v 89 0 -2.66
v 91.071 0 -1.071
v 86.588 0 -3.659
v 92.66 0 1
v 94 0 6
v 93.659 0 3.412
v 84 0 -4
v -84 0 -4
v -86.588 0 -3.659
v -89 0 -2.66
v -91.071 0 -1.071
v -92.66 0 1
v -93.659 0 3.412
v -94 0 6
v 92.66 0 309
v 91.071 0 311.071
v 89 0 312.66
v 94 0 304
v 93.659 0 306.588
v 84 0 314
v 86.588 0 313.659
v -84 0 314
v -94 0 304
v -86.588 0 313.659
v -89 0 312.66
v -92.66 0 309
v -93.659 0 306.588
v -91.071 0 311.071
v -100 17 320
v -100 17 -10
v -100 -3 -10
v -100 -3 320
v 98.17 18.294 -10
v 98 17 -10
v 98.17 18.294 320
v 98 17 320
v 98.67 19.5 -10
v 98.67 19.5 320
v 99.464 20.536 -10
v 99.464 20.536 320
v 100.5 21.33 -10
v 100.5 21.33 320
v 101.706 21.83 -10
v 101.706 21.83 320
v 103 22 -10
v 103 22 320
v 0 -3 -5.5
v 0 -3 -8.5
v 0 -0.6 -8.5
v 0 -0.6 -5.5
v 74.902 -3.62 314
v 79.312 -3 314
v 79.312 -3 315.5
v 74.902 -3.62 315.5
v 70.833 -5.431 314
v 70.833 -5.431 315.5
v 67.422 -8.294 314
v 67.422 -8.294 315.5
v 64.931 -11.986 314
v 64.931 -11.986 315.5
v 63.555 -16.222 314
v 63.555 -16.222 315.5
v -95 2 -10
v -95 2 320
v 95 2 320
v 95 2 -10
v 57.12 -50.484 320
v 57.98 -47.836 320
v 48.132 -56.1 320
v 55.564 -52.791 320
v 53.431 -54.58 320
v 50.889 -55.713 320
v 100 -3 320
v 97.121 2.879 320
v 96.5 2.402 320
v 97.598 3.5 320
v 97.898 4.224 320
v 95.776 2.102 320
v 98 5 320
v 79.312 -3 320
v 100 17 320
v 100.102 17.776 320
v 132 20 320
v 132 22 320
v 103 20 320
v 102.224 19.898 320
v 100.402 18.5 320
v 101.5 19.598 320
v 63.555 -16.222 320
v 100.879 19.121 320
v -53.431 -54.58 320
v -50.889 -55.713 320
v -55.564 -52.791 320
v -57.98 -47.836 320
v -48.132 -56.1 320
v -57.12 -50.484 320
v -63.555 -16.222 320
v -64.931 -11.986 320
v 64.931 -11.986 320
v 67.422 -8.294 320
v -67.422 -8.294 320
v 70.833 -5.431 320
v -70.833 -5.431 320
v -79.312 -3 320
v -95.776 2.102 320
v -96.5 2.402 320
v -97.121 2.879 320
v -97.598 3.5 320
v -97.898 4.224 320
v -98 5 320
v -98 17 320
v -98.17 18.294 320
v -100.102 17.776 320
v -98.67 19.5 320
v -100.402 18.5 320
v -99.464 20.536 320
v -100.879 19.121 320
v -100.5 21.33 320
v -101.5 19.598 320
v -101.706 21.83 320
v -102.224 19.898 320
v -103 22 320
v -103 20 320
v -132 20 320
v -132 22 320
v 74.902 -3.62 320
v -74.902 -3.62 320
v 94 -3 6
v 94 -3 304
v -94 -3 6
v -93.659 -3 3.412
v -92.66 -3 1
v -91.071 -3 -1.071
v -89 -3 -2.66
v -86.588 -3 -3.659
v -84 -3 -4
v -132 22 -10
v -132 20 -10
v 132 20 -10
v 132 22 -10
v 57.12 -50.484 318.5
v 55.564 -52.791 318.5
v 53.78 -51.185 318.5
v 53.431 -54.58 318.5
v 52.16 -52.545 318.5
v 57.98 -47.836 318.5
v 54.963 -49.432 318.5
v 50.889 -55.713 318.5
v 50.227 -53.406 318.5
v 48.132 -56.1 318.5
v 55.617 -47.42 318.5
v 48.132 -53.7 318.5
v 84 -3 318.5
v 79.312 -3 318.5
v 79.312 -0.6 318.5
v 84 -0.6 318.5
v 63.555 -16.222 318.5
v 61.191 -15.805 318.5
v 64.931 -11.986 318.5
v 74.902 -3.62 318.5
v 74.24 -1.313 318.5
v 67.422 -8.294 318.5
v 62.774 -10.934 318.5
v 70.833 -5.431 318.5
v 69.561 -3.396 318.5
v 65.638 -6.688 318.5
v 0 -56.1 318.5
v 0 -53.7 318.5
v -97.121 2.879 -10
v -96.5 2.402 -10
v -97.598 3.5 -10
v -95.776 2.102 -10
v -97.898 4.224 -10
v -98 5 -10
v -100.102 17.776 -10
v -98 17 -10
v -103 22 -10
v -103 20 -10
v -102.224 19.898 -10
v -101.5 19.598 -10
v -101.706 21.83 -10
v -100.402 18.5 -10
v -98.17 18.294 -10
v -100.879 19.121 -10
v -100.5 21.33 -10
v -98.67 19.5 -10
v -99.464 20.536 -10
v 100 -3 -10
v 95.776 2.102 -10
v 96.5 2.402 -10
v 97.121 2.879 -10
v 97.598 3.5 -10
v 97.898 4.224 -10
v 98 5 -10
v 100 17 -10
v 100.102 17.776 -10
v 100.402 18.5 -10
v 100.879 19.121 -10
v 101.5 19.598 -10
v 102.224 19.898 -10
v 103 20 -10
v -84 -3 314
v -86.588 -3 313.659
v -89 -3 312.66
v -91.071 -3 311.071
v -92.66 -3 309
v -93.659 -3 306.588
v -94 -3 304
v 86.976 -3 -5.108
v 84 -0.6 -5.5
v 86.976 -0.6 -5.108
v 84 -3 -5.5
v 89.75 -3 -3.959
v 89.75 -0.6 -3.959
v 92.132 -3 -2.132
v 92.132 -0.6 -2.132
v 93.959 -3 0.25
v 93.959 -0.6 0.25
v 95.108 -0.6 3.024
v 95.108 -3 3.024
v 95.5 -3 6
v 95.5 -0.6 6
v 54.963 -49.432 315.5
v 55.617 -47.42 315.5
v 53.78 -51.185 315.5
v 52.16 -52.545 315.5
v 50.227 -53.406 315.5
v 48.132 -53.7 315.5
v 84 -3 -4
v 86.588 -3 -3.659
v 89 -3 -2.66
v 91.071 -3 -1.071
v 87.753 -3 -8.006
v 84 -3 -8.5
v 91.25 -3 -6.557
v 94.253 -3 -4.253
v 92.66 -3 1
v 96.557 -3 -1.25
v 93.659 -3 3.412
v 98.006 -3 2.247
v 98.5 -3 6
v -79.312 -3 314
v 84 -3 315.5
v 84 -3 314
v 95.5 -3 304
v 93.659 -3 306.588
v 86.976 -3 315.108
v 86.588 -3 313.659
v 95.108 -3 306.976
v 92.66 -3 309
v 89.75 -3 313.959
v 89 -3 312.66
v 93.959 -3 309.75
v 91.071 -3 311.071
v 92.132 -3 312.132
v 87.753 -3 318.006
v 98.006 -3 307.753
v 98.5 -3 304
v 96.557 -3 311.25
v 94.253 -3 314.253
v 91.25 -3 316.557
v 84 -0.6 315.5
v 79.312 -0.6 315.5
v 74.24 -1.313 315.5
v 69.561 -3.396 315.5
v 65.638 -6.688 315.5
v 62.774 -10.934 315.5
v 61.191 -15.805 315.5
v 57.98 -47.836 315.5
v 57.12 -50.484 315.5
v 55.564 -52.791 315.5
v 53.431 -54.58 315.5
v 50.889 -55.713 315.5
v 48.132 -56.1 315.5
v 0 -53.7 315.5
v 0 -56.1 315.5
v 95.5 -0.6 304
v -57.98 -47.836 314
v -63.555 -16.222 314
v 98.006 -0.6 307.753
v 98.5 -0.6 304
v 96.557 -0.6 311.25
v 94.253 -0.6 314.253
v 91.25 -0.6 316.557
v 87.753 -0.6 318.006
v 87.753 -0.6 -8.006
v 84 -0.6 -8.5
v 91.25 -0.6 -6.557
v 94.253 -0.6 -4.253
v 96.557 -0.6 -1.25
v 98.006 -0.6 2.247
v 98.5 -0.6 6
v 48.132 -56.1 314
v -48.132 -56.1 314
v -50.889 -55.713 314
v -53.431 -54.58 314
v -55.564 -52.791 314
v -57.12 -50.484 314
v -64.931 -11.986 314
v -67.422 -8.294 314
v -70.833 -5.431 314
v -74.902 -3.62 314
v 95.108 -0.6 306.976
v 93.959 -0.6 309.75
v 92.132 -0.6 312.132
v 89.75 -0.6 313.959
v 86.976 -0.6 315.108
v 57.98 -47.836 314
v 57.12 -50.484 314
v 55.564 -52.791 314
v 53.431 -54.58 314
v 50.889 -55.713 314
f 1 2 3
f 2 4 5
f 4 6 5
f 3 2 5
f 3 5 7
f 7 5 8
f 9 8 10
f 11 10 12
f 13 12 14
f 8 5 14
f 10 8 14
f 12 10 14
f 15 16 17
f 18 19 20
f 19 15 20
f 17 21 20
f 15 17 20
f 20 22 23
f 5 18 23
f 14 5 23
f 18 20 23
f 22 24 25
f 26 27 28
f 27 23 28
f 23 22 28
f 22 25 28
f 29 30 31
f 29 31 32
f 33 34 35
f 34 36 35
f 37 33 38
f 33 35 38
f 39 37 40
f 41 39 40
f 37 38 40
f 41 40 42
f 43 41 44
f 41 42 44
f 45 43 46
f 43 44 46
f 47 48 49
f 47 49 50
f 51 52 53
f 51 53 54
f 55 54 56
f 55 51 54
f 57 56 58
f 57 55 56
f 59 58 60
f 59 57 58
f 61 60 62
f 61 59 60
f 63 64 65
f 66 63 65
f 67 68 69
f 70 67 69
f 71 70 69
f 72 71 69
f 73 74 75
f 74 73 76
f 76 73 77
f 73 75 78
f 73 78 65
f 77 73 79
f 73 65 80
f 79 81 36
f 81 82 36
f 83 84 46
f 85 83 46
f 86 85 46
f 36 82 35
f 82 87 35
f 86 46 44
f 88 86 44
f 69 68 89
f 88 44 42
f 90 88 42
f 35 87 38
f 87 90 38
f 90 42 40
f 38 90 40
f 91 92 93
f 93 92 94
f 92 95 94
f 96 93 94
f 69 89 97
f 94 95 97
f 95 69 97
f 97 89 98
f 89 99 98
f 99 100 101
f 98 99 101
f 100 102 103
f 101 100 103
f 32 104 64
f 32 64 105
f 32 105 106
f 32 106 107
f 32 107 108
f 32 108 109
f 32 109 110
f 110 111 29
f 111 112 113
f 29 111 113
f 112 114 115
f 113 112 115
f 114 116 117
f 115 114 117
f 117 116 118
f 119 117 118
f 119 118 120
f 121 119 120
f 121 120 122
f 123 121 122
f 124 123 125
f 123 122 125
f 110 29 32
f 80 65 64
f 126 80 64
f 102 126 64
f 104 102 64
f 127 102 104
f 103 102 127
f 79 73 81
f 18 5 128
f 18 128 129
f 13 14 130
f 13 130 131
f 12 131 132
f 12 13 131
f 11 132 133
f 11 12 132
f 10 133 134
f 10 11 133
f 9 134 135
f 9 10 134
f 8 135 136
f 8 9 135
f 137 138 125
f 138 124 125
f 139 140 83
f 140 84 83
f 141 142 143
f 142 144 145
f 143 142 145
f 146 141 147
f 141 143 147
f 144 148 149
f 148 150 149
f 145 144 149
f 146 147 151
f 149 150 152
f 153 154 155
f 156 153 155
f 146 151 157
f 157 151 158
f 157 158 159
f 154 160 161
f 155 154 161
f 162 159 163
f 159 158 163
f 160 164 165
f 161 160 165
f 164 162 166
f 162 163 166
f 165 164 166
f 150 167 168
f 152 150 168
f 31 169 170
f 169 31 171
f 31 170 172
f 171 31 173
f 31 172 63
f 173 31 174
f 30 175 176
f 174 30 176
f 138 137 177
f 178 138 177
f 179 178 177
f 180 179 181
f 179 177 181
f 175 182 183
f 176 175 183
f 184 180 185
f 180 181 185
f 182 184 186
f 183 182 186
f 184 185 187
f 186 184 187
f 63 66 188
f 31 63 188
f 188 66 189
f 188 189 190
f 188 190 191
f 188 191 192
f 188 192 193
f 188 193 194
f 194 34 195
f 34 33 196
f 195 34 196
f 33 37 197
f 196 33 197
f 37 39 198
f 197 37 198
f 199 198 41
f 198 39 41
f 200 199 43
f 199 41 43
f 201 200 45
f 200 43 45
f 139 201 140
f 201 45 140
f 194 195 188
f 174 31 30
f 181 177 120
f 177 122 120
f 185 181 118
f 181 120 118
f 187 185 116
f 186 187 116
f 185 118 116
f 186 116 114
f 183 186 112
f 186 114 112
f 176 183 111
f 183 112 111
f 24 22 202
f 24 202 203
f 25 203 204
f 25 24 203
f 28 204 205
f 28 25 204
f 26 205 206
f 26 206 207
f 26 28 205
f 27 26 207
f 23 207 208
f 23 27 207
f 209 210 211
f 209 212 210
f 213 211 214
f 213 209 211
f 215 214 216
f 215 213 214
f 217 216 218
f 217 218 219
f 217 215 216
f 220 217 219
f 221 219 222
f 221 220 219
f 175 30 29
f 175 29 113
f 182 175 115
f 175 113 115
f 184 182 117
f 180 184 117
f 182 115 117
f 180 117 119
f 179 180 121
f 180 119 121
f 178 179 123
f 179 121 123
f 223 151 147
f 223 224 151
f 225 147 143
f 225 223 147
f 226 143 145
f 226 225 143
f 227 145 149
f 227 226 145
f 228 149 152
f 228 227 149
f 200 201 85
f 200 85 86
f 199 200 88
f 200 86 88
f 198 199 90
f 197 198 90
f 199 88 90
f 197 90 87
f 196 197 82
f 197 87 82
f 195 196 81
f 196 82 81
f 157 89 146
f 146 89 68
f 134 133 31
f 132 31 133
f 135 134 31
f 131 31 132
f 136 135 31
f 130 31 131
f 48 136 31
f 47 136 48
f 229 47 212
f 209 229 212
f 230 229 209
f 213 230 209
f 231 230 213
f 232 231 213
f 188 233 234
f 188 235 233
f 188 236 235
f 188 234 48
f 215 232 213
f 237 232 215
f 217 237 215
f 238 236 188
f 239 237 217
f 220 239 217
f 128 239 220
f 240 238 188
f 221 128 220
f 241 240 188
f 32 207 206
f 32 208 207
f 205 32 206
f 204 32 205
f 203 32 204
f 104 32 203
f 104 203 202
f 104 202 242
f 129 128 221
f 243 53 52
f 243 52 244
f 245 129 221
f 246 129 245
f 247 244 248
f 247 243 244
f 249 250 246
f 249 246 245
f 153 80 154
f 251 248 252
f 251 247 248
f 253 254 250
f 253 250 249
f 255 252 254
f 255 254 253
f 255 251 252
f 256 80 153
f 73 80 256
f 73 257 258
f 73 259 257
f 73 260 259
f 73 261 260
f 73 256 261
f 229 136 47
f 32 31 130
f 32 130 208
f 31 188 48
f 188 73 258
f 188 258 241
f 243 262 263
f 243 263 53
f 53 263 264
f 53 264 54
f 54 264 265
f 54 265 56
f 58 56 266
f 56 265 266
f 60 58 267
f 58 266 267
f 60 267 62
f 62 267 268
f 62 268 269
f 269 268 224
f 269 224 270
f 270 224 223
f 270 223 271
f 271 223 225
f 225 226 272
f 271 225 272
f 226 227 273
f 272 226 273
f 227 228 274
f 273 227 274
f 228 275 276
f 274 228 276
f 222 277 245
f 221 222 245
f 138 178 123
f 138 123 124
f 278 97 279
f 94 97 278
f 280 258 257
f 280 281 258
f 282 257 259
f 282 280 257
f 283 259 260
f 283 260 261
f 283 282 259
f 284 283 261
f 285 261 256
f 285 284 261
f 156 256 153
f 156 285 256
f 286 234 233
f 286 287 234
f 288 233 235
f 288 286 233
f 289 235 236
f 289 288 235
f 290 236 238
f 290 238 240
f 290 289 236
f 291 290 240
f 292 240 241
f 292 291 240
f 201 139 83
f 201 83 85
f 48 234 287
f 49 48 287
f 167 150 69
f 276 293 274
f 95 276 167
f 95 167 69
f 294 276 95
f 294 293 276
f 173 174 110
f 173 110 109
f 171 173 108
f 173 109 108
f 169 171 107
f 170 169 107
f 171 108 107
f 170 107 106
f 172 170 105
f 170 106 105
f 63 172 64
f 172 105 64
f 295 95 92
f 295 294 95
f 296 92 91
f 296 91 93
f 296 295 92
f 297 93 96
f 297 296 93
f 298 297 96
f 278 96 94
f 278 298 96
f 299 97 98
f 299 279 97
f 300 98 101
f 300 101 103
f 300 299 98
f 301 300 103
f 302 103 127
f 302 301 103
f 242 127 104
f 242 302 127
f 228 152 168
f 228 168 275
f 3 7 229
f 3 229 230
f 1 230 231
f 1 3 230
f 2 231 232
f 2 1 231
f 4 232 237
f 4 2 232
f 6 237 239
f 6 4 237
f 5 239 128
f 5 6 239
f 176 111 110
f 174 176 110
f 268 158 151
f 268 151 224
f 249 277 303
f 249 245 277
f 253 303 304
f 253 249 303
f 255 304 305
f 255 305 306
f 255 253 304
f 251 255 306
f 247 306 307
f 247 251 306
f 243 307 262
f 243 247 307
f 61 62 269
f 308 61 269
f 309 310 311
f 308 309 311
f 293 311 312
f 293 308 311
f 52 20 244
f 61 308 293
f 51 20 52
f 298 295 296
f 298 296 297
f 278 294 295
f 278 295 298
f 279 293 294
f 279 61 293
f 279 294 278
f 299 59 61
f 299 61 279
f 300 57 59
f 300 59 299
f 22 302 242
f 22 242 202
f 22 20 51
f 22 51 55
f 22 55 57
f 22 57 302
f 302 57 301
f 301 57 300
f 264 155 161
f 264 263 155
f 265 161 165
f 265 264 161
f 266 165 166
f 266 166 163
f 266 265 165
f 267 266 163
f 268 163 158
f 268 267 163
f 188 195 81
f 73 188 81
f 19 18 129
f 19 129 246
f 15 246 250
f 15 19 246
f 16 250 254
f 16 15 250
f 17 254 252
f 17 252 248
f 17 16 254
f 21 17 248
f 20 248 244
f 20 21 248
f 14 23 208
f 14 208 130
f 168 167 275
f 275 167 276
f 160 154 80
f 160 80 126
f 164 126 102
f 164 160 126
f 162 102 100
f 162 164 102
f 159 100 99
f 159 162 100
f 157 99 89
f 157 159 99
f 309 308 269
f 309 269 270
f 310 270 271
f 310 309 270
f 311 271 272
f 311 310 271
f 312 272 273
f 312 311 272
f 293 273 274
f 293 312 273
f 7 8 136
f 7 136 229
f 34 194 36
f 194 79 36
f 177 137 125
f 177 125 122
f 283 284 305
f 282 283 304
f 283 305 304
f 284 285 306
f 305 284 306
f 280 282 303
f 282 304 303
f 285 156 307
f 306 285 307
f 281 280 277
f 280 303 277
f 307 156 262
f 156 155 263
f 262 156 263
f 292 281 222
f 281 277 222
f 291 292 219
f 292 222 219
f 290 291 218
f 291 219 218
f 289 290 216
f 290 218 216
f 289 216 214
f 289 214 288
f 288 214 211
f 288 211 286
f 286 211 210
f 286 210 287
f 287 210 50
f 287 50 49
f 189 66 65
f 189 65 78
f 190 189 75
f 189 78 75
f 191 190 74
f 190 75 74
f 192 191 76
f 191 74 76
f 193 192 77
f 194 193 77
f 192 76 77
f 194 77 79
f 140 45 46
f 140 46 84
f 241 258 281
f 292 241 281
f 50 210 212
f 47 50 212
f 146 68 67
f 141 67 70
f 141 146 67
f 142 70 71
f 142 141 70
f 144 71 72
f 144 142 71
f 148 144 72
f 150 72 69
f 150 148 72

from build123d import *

# Parameters (mm, degrees)
BOSS_EXTRU_1_DEPTH       = 320
BOSS_EXTRU_1_DEPTH_BACK  = 10
ESQUISSE3_W              = 200
ESQUISSE3_H              = 6
BOSS_EXTRU_2_DEPTH       = 56.1
ESQUISSE41_W             = 200
ESQUISSE41_H             = 330
BOSS_EXTRU_9_DEPTH       = 3
ENL_V_MAT_EXTRU_22_DEPTH = 6
CONG_8_R                 = 10
CONG_9_R                 = 16
ESQUISSE48_W             = 3
ESQUISSE48_H             = 2.4


with BuildPart() as part:
    # Esquisse1 → Boss.-Extru.1 (new body, two sides)
    with BuildSketch(Plane.XY) as boss_extru_1_sk:
        with BuildLine():
            Line((-95, 2), (95, 2))
            ThreePointArc((95, 2), (97.121320344, 2.878679656), (98, 5))
            Line((98, 5), (98, 17))
            ThreePointArc((98, 17), (99.464466094, 20.535533906), (103, 22))
            Line((103, 22), (127, 22))
            Line((127, 22), (132, 22))
            Line((132, 22), (132, 20))
            Line((132, 20), (127, 20))
            Line((127, 20), (103, 20))
            ThreePointArc((103, 20), (100.878679656, 19.121320344), (100, 17))
            Line((100, 17), (100, 0))
            Line((100, 0), (-100, 0))
            Line((-100, 0), (-100, 17))
            ThreePointArc((-100, 17), (-100.878679656, 19.121320344), (-103, 20))
            Line((-103, 20), (-127, 20))
            Line((-127, 20), (-132, 20))
            Line((-132, 20), (-132, 22))
            Line((-132, 22), (-127, 22))
            Line((-127, 22), (-103, 22))
            ThreePointArc((-103, 22), (-99.464466094, 20.535533906), (-98, 17))
            Line((-98, 17), (-98, 5))
            ThreePointArc((-98, 5), (-97.121320344, 2.878679656), (-95, 2))
        make_face()
    extrude(amount=BOSS_EXTRU_1_DEPTH)
    extrude(boss_extru_1_sk.sketch, amount=-BOSS_EXTRU_1_DEPTH_BACK)

    # Esquisse3 → Boss.-Extru.2 (add)
    with BuildSketch(Plane(origin=(0, 0, 0), x_dir=(-1, 0, 0), z_dir=(0, -1, 0))):
        with Locations((0, -317)):
            Rectangle(ESQUISSE3_W, ESQUISSE3_H)
    extrude(amount=BOSS_EXTRU_2_DEPTH)

    # Esquisse41 → Boss.-Extru.9 (add)
    with BuildSketch(Plane.XZ):
        with Locations((0, 155)):
            Rectangle(ESQUISSE41_W, ESQUISSE41_H)
        with BuildLine():
            Line((84, 314), (-84, 314))
            ThreePointArc((-84, 314), (-91.071067812, 311.071067812), (-94, 304))
            Line((-94, 304), (-94, 6))
            ThreePointArc((-94, 6), (-91.071067812, -1.071067812), (-84, -4))
            Line((-84, -4), (84, -4))
            ThreePointArc((84, -4), (91.071067812, -1.071067812), (94, 6))
            Line((94, 6), (94, 304))
            ThreePointArc((94, 304), (91.071067812, 311.071067812), (84, 314))
        make_face(mode=Mode.SUBTRACT)
    extrude(amount=BOSS_EXTRU_9_DEPTH)

    # Esquisse24 → Enlèv. mat.-Extru.22 (cut)
    with BuildSketch(Plane.XY.offset(320)):
        Polygon((65.886245289, -3), (56.523282614, -56.1), (100, -56.1), (100, -3), align=None)
        Polygon((-65.886245289, -3), (-56.523282614, -56.1), (-100, -56.1), (-100, -3), align=None)
    extrude(amount=-ENL_V_MAT_EXTRU_22_DEPTH, mode=Mode.SUBTRACT)

    # Congé8
    cong_8_edges = [part.edges().sort_by_distance(p)[0] for p in [
        (56.523282614, -56.1, 317),
        (-56.523282614, -56.1, 317),
    ]]
    fillet(cong_8_edges, radius=CONG_8_R)

    # Congé9
    cong_9_edges = [part.edges().sort_by_distance(p)[0] for p in [
        (65.886245289, -3, 317),
        (-65.886245289, -3, 317),
    ]]
    fillet(cong_9_edges, radius=CONG_9_R)

    # Enlèvement de matière-Balayage2: sweep along a curve in space
    with BuildLine() as enl_vement_de_mati_re_balayage2_path:
        Line((0, -3, -7), (84, -3, -7))
        ThreePointArc((84, -3, -7), (93.192388155, -3, -3.192388155), (97, -3, 6))
        Line((97, -3, 6), (97, -3, 304))
        ThreePointArc((97, -3, 304), (93.192388155, -3, 313.192388155), (84, -3, 317))
        Line((84, -3, 317), (79.311839388, -3, 317))
        ThreePointArc((63.55491534, -16.221629157, 317), (69.027237633, -6.74328891, 317), (79.311839388, -3, 317))
        Line((57.980363832, -47.836481777, 317), (63.55491534, -16.221629157, 317))
        ThreePointArc((48.132286302, -56.1, 317), (54.560162399, -53.760444431, 317), (57.980363832, -47.836481777, 317))
        Line((0, -56.1, 317), (48.132286302, -56.1, 317))
    # Esquisse48 → Enlèvement de matière-Balayage2 (sweep, cut)
    with BuildSketch(Plane(origin=(0, 0, 0), x_dir=(0, 0, -1), z_dir=(1, 0, 0))):
        with Locations((7, -1.8)):
            Rectangle(ESQUISSE48_W, ESQUISSE48_H)
    sweep(path=enl_vement_de_mati_re_balayage2_path.line, mode=Mode.SUBTRACT)


solid = part.part
